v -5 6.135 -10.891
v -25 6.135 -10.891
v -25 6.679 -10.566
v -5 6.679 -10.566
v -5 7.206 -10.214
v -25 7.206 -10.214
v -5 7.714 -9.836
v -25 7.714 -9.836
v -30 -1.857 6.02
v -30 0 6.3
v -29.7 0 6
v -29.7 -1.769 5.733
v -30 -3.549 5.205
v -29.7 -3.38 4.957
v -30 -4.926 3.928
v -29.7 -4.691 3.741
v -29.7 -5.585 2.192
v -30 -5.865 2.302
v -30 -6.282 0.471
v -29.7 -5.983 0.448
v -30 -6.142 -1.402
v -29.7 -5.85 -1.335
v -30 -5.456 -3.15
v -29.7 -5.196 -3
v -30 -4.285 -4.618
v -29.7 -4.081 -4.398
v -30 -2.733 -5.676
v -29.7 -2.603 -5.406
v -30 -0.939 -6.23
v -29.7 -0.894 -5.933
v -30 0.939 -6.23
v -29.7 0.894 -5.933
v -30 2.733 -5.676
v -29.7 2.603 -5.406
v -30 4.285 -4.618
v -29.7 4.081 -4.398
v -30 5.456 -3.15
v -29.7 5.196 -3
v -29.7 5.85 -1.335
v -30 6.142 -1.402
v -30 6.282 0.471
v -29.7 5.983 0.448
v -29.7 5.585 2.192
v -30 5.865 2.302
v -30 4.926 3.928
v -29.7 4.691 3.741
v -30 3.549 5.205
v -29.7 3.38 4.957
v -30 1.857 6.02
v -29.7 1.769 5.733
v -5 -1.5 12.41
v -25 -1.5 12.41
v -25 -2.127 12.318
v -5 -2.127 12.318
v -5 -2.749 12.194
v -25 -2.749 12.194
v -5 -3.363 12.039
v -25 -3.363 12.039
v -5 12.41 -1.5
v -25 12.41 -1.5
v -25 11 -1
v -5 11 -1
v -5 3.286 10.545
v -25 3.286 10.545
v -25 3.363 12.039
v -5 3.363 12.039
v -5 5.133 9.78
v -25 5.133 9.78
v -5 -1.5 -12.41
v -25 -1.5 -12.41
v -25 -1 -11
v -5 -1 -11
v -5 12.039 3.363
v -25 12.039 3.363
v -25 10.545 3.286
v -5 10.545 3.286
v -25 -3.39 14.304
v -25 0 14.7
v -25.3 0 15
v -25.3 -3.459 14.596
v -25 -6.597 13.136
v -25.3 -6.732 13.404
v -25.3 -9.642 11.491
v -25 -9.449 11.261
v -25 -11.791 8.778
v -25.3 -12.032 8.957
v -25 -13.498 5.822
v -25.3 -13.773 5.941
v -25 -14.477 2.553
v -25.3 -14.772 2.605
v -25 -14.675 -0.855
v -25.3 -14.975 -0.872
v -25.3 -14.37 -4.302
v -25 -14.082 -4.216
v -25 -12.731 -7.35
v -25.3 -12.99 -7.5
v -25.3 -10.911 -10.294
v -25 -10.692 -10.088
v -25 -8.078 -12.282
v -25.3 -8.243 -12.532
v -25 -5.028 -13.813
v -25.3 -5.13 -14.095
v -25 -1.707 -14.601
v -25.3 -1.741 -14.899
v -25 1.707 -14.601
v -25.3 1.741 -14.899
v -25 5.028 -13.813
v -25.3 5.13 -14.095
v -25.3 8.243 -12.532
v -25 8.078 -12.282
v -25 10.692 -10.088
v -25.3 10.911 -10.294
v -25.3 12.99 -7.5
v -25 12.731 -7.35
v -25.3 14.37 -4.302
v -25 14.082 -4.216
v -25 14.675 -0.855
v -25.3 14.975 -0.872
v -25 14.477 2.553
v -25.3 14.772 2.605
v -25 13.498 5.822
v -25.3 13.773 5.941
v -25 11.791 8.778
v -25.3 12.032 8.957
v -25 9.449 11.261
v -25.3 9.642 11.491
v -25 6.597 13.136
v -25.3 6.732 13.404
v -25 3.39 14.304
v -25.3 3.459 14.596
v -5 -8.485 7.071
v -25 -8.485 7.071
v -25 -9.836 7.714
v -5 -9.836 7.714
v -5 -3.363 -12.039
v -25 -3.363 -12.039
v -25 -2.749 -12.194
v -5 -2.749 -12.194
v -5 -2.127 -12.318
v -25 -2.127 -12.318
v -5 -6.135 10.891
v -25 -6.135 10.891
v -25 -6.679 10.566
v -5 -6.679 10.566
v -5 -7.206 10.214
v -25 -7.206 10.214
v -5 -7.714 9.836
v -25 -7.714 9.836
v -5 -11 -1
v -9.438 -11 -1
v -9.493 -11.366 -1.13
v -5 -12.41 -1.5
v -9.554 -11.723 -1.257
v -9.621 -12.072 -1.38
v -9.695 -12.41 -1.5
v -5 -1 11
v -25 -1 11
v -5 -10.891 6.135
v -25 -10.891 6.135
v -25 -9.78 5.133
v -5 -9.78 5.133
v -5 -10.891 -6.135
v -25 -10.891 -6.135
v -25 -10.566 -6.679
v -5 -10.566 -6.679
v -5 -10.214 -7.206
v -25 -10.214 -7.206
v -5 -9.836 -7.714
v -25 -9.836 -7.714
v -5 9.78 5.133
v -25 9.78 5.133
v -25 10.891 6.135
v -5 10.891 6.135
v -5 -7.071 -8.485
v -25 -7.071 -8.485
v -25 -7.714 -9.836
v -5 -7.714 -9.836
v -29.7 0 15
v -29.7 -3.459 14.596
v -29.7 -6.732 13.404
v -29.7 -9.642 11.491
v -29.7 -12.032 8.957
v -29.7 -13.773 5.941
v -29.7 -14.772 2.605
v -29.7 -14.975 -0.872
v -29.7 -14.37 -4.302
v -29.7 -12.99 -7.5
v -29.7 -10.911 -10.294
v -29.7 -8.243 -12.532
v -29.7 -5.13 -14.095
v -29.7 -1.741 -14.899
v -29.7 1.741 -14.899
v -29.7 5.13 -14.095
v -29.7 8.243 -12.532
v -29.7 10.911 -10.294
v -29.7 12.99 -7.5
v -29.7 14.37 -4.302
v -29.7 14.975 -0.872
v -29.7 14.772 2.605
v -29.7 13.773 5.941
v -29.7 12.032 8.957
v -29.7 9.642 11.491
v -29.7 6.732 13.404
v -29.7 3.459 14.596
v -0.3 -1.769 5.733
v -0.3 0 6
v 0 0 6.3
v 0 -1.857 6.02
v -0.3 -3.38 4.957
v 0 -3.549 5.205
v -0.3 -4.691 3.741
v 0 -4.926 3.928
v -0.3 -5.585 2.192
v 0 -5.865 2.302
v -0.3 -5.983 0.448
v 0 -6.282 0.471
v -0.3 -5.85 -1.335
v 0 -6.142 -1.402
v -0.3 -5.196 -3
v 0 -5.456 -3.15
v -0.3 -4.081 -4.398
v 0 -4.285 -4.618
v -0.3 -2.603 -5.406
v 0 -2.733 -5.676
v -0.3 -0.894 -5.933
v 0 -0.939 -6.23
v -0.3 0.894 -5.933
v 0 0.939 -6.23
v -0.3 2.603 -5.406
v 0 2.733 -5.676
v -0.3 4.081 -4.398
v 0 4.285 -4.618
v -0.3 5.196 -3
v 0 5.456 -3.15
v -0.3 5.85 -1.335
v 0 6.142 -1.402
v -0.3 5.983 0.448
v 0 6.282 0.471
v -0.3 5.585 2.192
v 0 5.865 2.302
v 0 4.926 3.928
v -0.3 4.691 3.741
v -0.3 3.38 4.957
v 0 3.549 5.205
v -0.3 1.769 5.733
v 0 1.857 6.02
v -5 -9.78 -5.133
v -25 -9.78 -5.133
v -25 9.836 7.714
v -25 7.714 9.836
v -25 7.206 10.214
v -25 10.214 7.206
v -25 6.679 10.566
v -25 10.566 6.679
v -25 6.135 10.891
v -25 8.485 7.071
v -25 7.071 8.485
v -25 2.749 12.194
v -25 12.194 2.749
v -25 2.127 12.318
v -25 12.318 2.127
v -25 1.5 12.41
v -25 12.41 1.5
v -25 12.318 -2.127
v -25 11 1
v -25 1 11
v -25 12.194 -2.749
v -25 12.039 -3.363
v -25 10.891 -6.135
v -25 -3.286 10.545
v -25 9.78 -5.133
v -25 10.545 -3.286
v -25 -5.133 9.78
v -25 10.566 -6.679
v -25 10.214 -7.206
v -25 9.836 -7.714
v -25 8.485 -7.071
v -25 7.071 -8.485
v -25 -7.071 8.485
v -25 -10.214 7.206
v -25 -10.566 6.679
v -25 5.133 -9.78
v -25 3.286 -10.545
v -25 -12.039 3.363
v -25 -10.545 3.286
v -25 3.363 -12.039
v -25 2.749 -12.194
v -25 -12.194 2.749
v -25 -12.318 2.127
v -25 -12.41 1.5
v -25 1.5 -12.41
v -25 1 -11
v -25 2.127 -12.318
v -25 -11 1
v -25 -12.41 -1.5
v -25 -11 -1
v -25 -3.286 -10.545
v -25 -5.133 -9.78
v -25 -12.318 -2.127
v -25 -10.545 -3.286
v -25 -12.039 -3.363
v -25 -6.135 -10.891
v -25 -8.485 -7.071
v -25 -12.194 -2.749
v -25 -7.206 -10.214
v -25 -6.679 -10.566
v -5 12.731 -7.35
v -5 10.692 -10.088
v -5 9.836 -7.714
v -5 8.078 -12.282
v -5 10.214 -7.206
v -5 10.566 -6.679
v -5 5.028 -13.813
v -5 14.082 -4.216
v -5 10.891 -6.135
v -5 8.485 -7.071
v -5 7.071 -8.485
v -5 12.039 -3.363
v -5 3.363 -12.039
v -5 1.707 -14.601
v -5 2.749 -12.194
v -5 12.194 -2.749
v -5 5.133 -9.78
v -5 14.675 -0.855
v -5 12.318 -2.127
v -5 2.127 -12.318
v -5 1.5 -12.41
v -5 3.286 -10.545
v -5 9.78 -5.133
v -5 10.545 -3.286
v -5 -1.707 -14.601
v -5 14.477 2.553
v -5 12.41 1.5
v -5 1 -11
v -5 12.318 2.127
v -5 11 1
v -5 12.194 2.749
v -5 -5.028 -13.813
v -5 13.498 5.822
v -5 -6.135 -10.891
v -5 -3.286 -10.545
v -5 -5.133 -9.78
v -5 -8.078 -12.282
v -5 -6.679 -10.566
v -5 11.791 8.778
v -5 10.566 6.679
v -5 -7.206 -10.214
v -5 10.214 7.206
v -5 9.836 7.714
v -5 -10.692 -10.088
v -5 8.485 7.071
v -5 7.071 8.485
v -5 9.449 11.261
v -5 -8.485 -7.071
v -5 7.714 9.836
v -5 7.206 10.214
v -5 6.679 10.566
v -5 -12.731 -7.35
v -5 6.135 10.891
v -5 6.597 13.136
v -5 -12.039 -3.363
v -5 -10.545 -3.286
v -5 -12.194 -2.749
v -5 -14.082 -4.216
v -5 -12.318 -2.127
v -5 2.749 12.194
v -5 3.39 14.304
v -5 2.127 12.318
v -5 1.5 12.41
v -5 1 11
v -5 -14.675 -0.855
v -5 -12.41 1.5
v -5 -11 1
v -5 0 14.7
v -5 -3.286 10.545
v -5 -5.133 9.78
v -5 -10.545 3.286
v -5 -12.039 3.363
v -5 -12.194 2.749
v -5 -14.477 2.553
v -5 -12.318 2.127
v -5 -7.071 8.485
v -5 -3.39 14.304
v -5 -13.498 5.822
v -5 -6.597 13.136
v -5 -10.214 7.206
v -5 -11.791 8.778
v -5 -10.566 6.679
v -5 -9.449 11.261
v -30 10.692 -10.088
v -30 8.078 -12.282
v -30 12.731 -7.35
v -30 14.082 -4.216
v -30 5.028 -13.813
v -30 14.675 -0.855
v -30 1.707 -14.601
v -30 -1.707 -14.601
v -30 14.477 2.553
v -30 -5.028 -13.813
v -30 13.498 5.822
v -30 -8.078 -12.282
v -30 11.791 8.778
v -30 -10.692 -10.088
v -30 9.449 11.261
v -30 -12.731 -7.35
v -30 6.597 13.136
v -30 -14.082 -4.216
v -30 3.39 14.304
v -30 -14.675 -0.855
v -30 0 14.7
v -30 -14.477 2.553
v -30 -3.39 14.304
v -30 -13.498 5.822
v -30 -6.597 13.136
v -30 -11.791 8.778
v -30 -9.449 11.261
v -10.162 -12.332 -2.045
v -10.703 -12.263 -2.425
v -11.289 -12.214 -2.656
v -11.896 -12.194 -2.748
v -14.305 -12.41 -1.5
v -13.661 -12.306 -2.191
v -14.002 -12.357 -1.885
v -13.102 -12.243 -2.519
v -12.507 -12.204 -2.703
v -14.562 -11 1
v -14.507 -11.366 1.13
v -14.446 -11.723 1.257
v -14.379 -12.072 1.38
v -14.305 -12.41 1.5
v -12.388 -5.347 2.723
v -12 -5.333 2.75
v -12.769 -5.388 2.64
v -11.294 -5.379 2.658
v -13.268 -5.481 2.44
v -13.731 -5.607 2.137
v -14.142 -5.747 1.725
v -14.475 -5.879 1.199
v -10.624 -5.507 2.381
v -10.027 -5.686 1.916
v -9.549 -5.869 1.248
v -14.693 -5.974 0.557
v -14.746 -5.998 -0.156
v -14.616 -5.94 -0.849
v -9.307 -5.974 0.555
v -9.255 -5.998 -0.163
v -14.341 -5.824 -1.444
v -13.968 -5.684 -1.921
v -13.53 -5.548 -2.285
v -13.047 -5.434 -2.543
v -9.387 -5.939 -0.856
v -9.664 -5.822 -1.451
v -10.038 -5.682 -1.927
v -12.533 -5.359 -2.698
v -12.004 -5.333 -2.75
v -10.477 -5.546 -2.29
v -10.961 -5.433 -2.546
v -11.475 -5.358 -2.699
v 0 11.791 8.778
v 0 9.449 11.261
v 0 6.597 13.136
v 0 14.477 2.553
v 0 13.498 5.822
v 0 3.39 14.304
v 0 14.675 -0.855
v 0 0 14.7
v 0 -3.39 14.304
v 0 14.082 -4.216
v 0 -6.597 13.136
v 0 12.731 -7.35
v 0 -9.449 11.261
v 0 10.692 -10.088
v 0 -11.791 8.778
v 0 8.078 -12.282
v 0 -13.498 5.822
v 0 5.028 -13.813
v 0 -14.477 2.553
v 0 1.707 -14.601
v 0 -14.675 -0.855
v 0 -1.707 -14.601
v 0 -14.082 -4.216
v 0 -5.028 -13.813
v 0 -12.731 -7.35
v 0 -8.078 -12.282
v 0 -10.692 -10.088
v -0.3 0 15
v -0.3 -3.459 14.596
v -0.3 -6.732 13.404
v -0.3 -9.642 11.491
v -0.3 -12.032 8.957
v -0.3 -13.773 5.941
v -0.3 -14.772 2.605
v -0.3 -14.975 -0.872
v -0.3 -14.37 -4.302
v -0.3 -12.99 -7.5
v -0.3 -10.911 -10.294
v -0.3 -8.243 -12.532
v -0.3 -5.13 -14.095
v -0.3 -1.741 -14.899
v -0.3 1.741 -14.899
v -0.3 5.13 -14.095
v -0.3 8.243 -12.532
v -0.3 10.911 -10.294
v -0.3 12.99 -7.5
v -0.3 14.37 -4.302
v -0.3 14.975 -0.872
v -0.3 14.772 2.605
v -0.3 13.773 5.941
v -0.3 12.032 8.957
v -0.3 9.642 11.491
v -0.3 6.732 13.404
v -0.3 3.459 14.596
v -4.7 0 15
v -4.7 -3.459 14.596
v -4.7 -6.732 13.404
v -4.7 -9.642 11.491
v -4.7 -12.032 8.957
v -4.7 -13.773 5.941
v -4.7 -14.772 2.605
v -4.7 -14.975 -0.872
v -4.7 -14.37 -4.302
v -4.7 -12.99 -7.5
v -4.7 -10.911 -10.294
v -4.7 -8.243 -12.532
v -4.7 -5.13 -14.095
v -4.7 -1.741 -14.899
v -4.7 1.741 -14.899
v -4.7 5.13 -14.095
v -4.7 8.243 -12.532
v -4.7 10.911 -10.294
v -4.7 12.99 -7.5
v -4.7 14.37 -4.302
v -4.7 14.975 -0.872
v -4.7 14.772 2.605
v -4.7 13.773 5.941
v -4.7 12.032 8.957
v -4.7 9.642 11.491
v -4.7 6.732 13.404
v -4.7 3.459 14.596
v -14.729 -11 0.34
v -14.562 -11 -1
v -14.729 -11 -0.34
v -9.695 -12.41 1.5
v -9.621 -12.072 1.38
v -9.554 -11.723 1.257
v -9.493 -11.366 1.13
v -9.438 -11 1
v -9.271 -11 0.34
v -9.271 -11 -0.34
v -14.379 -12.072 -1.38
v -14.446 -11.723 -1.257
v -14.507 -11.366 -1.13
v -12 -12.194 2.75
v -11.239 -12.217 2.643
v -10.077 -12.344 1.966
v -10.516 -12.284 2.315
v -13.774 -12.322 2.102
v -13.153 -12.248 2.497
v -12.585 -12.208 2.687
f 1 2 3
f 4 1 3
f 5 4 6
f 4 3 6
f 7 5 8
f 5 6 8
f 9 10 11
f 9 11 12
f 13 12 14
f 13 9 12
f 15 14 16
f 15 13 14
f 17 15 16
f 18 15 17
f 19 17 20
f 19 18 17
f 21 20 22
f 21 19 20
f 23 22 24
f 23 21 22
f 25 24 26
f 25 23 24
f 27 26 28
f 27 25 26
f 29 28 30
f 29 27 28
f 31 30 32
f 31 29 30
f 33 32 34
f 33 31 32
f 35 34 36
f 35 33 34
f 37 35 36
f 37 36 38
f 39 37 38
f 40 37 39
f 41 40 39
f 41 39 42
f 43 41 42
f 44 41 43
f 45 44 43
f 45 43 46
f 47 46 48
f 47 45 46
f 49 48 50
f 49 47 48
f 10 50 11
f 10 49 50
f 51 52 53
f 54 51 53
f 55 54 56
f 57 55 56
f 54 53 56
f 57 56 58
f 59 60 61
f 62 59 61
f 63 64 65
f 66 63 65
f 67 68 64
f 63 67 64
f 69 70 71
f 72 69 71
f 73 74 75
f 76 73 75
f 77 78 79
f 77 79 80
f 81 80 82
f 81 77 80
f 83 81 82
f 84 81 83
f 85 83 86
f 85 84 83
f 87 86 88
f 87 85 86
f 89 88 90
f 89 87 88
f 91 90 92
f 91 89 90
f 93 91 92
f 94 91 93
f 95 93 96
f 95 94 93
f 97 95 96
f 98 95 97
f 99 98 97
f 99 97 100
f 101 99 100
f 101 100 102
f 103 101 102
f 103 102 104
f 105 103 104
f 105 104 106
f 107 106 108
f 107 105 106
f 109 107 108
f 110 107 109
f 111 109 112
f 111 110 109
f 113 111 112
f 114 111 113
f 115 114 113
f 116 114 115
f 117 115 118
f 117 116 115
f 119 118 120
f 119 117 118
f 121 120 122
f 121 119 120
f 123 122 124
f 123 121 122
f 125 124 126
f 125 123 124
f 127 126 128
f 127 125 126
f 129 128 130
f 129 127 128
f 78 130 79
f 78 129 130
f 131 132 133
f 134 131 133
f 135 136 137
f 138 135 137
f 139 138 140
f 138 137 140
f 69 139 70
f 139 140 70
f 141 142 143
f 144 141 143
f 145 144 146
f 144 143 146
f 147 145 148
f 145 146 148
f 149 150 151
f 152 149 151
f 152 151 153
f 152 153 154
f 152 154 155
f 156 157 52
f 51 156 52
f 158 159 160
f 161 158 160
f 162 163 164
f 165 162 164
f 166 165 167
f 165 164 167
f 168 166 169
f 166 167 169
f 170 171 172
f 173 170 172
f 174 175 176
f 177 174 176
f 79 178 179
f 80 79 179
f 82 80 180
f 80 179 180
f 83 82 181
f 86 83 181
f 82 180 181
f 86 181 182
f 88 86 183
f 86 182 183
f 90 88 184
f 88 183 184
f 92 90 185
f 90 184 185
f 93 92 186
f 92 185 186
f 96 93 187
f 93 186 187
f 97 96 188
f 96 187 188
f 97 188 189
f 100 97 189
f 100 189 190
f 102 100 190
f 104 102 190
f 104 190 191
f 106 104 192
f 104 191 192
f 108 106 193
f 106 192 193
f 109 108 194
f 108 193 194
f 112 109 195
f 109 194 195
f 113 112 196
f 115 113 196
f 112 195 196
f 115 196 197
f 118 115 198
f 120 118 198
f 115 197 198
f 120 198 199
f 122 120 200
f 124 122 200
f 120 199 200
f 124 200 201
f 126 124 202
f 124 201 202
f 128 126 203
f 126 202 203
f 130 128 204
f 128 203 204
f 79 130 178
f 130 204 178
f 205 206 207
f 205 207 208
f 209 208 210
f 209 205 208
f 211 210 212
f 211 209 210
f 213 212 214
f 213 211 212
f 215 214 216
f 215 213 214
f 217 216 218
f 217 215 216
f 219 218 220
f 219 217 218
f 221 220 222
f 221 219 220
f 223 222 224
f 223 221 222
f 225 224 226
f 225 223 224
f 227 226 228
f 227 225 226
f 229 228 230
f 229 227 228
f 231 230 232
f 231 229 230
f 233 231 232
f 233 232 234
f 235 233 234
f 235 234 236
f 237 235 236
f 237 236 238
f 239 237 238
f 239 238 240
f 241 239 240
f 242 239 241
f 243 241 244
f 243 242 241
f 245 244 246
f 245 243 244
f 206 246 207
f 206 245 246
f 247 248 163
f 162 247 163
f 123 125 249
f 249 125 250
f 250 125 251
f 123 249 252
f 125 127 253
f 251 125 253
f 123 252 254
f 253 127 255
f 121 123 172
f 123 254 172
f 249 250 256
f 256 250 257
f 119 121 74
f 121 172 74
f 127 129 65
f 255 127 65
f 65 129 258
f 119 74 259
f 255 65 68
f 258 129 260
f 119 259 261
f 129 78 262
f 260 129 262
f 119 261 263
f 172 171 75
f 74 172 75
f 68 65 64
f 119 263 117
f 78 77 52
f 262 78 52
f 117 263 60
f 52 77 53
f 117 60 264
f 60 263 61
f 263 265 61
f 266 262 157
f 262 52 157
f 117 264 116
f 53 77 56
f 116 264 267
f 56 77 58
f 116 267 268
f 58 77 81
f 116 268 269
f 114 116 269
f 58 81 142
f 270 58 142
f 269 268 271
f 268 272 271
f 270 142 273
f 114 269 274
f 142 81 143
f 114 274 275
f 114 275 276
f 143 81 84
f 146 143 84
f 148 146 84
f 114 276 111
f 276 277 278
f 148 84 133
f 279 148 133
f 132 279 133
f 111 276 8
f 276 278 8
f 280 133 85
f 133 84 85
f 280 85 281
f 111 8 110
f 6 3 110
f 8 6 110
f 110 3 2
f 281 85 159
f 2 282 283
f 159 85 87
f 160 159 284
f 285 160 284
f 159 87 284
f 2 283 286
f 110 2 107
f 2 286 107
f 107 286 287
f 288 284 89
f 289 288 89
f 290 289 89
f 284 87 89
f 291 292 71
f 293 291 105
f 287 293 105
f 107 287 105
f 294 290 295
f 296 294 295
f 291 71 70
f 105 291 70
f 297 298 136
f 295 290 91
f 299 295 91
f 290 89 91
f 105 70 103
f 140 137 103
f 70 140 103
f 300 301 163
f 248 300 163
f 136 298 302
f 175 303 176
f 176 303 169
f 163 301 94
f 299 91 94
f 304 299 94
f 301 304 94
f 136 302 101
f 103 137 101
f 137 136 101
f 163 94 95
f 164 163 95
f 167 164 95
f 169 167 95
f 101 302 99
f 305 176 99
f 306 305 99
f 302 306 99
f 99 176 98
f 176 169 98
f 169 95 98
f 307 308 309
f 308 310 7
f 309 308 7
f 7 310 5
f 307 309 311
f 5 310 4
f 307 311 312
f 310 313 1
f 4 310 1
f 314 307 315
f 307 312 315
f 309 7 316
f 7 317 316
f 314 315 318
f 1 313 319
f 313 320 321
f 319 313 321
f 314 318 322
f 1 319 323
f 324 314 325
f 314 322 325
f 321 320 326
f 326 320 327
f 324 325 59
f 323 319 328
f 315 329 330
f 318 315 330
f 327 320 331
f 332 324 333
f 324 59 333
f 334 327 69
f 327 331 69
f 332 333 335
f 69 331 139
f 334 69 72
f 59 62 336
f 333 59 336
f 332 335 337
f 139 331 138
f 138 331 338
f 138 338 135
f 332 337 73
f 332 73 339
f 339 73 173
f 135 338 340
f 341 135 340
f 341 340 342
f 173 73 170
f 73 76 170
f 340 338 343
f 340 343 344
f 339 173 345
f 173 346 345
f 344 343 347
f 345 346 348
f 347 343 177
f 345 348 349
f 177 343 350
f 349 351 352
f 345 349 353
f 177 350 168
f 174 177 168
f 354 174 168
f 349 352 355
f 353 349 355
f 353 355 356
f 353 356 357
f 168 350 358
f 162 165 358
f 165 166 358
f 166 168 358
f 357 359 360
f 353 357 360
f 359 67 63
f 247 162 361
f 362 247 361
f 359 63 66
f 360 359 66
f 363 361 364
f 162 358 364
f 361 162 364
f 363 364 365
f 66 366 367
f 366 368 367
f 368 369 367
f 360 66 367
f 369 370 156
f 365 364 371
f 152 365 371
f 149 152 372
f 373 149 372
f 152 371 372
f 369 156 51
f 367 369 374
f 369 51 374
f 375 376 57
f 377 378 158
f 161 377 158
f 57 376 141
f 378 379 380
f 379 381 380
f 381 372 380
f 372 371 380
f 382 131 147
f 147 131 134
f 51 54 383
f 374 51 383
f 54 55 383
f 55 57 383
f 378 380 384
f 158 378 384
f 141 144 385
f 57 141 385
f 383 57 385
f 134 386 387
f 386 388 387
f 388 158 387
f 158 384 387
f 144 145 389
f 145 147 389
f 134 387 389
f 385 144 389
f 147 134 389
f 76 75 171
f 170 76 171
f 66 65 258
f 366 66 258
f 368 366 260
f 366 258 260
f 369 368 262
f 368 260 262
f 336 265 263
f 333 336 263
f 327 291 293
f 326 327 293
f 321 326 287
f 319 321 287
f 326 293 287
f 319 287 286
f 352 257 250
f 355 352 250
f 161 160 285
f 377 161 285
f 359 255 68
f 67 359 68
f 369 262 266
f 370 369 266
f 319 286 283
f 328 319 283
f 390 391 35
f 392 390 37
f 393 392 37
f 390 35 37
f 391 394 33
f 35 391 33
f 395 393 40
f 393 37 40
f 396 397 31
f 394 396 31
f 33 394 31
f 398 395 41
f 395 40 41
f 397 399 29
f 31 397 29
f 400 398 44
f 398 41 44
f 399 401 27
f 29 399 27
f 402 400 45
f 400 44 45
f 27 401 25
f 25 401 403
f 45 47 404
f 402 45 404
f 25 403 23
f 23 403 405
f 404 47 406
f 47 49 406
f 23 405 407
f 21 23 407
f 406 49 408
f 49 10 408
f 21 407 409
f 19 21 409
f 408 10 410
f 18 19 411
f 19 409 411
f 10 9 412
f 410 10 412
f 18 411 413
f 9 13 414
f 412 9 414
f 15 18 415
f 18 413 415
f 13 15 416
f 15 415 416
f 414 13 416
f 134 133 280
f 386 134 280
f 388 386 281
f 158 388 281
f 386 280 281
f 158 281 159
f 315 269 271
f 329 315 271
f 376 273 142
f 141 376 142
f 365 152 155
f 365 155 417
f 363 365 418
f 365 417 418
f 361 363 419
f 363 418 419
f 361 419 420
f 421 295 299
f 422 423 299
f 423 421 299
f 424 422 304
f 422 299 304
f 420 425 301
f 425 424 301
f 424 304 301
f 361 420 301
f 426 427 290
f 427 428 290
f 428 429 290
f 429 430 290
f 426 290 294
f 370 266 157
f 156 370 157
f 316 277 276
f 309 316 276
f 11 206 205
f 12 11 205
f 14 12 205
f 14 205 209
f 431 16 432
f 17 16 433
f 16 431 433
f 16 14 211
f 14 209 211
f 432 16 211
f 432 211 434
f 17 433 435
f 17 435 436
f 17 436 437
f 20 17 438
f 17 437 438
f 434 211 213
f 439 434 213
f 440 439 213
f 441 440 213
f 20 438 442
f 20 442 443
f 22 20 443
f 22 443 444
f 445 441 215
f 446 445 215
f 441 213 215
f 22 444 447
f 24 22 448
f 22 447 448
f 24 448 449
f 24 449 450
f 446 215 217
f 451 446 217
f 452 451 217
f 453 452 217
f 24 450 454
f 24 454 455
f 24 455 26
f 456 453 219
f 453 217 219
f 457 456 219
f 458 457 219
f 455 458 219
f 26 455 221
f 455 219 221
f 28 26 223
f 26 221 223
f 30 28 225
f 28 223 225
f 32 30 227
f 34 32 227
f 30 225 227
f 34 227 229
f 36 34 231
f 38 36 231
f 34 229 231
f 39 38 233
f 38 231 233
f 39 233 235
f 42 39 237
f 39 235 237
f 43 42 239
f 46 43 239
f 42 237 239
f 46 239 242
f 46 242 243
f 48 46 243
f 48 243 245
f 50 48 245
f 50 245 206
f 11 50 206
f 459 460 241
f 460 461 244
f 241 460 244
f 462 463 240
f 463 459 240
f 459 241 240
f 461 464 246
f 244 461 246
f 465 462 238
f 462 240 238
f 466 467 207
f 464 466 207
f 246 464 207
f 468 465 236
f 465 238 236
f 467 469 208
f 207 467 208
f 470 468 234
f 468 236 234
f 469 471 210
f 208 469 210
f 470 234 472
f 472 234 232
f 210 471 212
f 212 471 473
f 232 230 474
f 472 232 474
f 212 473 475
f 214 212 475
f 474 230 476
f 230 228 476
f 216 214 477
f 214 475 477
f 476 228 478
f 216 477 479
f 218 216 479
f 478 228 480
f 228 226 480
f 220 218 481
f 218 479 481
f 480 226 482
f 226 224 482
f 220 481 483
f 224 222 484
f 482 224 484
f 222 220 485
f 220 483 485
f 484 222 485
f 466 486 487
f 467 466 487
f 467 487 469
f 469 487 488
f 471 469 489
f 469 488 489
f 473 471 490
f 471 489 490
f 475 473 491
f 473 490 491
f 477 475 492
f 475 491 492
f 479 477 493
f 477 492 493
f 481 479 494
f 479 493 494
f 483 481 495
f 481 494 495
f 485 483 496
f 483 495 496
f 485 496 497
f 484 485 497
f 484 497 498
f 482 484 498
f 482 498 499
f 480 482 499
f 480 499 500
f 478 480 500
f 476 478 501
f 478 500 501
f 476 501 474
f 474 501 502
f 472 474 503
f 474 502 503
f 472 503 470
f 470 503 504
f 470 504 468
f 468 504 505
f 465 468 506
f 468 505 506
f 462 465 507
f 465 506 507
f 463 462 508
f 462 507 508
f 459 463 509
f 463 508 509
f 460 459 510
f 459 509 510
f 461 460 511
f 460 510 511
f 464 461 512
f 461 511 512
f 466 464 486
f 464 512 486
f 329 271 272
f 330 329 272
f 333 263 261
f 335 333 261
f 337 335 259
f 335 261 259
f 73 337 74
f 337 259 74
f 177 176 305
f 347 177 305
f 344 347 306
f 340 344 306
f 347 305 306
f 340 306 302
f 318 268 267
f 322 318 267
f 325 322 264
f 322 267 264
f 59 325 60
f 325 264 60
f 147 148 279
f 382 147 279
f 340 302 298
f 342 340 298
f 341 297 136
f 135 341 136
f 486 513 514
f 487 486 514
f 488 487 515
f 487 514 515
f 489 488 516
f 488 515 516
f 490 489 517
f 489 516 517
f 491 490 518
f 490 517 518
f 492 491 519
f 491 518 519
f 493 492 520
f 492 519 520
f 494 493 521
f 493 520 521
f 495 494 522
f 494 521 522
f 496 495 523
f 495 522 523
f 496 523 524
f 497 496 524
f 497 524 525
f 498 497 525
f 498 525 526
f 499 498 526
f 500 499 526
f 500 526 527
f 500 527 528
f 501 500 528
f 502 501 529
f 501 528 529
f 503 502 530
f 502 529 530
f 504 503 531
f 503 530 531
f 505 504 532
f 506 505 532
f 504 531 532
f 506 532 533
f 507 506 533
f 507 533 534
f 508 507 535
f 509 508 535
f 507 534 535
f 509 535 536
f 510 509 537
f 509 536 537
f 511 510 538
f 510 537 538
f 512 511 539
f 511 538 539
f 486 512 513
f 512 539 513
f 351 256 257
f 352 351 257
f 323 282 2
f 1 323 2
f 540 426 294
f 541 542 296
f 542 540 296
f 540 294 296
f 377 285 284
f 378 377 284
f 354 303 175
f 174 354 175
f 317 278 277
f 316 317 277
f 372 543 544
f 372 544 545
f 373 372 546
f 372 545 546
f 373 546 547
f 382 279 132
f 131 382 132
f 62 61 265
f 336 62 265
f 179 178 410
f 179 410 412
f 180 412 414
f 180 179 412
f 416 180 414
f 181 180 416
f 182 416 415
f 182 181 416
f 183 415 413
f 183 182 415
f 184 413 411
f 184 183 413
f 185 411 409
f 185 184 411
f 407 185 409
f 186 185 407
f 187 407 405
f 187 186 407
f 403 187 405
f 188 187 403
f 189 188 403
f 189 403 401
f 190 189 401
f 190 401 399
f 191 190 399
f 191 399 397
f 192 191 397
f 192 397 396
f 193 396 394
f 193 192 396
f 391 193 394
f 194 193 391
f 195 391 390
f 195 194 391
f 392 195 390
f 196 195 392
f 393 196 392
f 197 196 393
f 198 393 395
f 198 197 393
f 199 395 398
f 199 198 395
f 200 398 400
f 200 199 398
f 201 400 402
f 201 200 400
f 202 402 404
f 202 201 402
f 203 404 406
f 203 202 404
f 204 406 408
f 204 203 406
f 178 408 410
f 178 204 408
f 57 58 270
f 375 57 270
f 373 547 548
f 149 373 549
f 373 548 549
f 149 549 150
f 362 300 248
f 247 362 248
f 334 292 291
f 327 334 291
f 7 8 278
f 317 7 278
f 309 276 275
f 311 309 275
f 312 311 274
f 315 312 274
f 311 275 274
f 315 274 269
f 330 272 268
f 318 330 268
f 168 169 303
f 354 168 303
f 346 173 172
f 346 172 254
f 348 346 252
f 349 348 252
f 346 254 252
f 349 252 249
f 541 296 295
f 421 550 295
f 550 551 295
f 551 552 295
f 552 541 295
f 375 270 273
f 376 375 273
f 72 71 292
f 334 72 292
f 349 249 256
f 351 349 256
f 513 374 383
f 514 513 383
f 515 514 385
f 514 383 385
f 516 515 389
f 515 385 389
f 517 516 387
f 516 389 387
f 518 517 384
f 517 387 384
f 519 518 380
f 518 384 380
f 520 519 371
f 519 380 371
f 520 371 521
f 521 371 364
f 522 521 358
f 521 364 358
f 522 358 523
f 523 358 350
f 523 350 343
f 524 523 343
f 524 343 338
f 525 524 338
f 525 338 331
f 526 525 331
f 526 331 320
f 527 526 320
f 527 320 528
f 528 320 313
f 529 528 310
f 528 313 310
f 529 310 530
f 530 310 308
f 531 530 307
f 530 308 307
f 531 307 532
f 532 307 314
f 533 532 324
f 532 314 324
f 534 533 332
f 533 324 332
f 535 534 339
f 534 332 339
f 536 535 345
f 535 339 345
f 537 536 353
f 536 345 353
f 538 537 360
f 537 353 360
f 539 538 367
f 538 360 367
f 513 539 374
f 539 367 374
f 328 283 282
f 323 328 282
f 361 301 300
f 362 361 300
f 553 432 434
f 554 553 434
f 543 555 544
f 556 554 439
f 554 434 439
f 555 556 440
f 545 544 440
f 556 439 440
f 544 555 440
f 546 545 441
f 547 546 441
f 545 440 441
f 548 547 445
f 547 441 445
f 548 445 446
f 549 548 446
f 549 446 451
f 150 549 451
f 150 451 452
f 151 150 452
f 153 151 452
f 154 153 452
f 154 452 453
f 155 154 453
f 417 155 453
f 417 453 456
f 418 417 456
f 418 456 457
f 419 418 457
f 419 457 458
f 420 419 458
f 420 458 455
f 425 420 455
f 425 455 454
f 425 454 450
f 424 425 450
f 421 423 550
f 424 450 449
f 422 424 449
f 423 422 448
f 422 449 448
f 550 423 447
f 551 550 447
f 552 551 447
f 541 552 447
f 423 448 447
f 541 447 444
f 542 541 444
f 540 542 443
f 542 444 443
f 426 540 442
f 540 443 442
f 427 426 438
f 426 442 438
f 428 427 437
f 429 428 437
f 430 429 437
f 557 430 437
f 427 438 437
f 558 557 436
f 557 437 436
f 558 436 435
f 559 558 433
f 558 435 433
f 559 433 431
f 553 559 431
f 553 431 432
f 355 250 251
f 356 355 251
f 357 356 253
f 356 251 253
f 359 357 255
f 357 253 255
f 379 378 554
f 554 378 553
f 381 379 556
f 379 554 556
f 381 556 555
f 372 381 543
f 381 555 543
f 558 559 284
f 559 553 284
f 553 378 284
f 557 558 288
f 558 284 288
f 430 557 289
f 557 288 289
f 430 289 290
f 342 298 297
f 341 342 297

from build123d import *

# Parameters (mm, degrees)
SKETCH_2_R               = 2.75
CUT_EXTRUDE_1_DEPTH      = 37.742346142
CUT_EXTRUDE_START        = 20
CUT_EXTRUDE_2_DEPTH      = 20
PATTERN_CIRCULAR_1_COUNT = 16
CHAMFER_1_SIZE           = 0.3


with BuildPart() as part:
    # Эскиз1 → Повернуть1 (revolve)
    with BuildSketch(Plane.XY, mode=Mode.PRIVATE) as revolve_1_sk:
        Polygon((0, 6), (0, 15), (-5, 15), (-5, 12.5), (-25, 12.5), (-25, 15), (-30, 15), (-30, 6), align=None)
    revolve(revolve_1_sk.sketch.rotate(Axis((-33.310992453, 0, 0), (1, 0, 0)), 90), axis=Axis((-33.310992453, 0, 0), (1, 0, 0)))

    # Эскиз2 → Вырез-Вытянуть1 (cut, through all)
    with BuildSketch(Plane(origin=(0, 0, 0), x_dir=(1, 0, 0), z_dir=(0, 1, 0))):
        with Locations(Location((-12, 0, 0), (0, 0, 270))):
            Circle(SKETCH_2_R)
    extrude(amount=-CUT_EXTRUDE_1_DEPTH, mode=Mode.SUBTRACT)

    # Эскиз3 → Вырез-Вытянуть2 (cut)
    with BuildSketch(Plane.ZY.offset(5).offset(CUT_EXTRUDE_START)):
        with BuildLine():
            Line((-1.5, 12.409673646), (-1, 11))
            Line((-1, 11), (1, 11))
            Line((1, 11), (1.5, 12.409673646))
            ThreePointArc((1.5, 12.409673646), (0, 12.5), (-1.5, 12.409673646))
        make_face()
    cut_extrude_2 = extrude(amount=-CUT_EXTRUDE_2_DEPTH, mode=Mode.SUBTRACT)

    # Круговой массив1: Вырез-Вытянуть2 ×16 about axis
    pattern_circular_1_axis = Axis((0, 0, 0), (1, 0, 0))
    for i in range(1, PATTERN_CIRCULAR_1_COUNT):
        add(cut_extrude_2.rotate(pattern_circular_1_axis, i * 360 / PATTERN_CIRCULAR_1_COUNT), mode=Mode.SUBTRACT)

    # Фаска1
    chamfer_1_edges = [part.edges().sort_by_distance(p)[0] for p in [
        (0, 0, -6),
        (-30, 0, -6),
        (-30, 0, -15),
        (-25, 0, -15),
        (-5, 0, -15),
        (0, 0, -15),
    ]]
    chamfer(chamfer_1_edges, length=CHAMFER_1_SIZE)


solid = part.part
